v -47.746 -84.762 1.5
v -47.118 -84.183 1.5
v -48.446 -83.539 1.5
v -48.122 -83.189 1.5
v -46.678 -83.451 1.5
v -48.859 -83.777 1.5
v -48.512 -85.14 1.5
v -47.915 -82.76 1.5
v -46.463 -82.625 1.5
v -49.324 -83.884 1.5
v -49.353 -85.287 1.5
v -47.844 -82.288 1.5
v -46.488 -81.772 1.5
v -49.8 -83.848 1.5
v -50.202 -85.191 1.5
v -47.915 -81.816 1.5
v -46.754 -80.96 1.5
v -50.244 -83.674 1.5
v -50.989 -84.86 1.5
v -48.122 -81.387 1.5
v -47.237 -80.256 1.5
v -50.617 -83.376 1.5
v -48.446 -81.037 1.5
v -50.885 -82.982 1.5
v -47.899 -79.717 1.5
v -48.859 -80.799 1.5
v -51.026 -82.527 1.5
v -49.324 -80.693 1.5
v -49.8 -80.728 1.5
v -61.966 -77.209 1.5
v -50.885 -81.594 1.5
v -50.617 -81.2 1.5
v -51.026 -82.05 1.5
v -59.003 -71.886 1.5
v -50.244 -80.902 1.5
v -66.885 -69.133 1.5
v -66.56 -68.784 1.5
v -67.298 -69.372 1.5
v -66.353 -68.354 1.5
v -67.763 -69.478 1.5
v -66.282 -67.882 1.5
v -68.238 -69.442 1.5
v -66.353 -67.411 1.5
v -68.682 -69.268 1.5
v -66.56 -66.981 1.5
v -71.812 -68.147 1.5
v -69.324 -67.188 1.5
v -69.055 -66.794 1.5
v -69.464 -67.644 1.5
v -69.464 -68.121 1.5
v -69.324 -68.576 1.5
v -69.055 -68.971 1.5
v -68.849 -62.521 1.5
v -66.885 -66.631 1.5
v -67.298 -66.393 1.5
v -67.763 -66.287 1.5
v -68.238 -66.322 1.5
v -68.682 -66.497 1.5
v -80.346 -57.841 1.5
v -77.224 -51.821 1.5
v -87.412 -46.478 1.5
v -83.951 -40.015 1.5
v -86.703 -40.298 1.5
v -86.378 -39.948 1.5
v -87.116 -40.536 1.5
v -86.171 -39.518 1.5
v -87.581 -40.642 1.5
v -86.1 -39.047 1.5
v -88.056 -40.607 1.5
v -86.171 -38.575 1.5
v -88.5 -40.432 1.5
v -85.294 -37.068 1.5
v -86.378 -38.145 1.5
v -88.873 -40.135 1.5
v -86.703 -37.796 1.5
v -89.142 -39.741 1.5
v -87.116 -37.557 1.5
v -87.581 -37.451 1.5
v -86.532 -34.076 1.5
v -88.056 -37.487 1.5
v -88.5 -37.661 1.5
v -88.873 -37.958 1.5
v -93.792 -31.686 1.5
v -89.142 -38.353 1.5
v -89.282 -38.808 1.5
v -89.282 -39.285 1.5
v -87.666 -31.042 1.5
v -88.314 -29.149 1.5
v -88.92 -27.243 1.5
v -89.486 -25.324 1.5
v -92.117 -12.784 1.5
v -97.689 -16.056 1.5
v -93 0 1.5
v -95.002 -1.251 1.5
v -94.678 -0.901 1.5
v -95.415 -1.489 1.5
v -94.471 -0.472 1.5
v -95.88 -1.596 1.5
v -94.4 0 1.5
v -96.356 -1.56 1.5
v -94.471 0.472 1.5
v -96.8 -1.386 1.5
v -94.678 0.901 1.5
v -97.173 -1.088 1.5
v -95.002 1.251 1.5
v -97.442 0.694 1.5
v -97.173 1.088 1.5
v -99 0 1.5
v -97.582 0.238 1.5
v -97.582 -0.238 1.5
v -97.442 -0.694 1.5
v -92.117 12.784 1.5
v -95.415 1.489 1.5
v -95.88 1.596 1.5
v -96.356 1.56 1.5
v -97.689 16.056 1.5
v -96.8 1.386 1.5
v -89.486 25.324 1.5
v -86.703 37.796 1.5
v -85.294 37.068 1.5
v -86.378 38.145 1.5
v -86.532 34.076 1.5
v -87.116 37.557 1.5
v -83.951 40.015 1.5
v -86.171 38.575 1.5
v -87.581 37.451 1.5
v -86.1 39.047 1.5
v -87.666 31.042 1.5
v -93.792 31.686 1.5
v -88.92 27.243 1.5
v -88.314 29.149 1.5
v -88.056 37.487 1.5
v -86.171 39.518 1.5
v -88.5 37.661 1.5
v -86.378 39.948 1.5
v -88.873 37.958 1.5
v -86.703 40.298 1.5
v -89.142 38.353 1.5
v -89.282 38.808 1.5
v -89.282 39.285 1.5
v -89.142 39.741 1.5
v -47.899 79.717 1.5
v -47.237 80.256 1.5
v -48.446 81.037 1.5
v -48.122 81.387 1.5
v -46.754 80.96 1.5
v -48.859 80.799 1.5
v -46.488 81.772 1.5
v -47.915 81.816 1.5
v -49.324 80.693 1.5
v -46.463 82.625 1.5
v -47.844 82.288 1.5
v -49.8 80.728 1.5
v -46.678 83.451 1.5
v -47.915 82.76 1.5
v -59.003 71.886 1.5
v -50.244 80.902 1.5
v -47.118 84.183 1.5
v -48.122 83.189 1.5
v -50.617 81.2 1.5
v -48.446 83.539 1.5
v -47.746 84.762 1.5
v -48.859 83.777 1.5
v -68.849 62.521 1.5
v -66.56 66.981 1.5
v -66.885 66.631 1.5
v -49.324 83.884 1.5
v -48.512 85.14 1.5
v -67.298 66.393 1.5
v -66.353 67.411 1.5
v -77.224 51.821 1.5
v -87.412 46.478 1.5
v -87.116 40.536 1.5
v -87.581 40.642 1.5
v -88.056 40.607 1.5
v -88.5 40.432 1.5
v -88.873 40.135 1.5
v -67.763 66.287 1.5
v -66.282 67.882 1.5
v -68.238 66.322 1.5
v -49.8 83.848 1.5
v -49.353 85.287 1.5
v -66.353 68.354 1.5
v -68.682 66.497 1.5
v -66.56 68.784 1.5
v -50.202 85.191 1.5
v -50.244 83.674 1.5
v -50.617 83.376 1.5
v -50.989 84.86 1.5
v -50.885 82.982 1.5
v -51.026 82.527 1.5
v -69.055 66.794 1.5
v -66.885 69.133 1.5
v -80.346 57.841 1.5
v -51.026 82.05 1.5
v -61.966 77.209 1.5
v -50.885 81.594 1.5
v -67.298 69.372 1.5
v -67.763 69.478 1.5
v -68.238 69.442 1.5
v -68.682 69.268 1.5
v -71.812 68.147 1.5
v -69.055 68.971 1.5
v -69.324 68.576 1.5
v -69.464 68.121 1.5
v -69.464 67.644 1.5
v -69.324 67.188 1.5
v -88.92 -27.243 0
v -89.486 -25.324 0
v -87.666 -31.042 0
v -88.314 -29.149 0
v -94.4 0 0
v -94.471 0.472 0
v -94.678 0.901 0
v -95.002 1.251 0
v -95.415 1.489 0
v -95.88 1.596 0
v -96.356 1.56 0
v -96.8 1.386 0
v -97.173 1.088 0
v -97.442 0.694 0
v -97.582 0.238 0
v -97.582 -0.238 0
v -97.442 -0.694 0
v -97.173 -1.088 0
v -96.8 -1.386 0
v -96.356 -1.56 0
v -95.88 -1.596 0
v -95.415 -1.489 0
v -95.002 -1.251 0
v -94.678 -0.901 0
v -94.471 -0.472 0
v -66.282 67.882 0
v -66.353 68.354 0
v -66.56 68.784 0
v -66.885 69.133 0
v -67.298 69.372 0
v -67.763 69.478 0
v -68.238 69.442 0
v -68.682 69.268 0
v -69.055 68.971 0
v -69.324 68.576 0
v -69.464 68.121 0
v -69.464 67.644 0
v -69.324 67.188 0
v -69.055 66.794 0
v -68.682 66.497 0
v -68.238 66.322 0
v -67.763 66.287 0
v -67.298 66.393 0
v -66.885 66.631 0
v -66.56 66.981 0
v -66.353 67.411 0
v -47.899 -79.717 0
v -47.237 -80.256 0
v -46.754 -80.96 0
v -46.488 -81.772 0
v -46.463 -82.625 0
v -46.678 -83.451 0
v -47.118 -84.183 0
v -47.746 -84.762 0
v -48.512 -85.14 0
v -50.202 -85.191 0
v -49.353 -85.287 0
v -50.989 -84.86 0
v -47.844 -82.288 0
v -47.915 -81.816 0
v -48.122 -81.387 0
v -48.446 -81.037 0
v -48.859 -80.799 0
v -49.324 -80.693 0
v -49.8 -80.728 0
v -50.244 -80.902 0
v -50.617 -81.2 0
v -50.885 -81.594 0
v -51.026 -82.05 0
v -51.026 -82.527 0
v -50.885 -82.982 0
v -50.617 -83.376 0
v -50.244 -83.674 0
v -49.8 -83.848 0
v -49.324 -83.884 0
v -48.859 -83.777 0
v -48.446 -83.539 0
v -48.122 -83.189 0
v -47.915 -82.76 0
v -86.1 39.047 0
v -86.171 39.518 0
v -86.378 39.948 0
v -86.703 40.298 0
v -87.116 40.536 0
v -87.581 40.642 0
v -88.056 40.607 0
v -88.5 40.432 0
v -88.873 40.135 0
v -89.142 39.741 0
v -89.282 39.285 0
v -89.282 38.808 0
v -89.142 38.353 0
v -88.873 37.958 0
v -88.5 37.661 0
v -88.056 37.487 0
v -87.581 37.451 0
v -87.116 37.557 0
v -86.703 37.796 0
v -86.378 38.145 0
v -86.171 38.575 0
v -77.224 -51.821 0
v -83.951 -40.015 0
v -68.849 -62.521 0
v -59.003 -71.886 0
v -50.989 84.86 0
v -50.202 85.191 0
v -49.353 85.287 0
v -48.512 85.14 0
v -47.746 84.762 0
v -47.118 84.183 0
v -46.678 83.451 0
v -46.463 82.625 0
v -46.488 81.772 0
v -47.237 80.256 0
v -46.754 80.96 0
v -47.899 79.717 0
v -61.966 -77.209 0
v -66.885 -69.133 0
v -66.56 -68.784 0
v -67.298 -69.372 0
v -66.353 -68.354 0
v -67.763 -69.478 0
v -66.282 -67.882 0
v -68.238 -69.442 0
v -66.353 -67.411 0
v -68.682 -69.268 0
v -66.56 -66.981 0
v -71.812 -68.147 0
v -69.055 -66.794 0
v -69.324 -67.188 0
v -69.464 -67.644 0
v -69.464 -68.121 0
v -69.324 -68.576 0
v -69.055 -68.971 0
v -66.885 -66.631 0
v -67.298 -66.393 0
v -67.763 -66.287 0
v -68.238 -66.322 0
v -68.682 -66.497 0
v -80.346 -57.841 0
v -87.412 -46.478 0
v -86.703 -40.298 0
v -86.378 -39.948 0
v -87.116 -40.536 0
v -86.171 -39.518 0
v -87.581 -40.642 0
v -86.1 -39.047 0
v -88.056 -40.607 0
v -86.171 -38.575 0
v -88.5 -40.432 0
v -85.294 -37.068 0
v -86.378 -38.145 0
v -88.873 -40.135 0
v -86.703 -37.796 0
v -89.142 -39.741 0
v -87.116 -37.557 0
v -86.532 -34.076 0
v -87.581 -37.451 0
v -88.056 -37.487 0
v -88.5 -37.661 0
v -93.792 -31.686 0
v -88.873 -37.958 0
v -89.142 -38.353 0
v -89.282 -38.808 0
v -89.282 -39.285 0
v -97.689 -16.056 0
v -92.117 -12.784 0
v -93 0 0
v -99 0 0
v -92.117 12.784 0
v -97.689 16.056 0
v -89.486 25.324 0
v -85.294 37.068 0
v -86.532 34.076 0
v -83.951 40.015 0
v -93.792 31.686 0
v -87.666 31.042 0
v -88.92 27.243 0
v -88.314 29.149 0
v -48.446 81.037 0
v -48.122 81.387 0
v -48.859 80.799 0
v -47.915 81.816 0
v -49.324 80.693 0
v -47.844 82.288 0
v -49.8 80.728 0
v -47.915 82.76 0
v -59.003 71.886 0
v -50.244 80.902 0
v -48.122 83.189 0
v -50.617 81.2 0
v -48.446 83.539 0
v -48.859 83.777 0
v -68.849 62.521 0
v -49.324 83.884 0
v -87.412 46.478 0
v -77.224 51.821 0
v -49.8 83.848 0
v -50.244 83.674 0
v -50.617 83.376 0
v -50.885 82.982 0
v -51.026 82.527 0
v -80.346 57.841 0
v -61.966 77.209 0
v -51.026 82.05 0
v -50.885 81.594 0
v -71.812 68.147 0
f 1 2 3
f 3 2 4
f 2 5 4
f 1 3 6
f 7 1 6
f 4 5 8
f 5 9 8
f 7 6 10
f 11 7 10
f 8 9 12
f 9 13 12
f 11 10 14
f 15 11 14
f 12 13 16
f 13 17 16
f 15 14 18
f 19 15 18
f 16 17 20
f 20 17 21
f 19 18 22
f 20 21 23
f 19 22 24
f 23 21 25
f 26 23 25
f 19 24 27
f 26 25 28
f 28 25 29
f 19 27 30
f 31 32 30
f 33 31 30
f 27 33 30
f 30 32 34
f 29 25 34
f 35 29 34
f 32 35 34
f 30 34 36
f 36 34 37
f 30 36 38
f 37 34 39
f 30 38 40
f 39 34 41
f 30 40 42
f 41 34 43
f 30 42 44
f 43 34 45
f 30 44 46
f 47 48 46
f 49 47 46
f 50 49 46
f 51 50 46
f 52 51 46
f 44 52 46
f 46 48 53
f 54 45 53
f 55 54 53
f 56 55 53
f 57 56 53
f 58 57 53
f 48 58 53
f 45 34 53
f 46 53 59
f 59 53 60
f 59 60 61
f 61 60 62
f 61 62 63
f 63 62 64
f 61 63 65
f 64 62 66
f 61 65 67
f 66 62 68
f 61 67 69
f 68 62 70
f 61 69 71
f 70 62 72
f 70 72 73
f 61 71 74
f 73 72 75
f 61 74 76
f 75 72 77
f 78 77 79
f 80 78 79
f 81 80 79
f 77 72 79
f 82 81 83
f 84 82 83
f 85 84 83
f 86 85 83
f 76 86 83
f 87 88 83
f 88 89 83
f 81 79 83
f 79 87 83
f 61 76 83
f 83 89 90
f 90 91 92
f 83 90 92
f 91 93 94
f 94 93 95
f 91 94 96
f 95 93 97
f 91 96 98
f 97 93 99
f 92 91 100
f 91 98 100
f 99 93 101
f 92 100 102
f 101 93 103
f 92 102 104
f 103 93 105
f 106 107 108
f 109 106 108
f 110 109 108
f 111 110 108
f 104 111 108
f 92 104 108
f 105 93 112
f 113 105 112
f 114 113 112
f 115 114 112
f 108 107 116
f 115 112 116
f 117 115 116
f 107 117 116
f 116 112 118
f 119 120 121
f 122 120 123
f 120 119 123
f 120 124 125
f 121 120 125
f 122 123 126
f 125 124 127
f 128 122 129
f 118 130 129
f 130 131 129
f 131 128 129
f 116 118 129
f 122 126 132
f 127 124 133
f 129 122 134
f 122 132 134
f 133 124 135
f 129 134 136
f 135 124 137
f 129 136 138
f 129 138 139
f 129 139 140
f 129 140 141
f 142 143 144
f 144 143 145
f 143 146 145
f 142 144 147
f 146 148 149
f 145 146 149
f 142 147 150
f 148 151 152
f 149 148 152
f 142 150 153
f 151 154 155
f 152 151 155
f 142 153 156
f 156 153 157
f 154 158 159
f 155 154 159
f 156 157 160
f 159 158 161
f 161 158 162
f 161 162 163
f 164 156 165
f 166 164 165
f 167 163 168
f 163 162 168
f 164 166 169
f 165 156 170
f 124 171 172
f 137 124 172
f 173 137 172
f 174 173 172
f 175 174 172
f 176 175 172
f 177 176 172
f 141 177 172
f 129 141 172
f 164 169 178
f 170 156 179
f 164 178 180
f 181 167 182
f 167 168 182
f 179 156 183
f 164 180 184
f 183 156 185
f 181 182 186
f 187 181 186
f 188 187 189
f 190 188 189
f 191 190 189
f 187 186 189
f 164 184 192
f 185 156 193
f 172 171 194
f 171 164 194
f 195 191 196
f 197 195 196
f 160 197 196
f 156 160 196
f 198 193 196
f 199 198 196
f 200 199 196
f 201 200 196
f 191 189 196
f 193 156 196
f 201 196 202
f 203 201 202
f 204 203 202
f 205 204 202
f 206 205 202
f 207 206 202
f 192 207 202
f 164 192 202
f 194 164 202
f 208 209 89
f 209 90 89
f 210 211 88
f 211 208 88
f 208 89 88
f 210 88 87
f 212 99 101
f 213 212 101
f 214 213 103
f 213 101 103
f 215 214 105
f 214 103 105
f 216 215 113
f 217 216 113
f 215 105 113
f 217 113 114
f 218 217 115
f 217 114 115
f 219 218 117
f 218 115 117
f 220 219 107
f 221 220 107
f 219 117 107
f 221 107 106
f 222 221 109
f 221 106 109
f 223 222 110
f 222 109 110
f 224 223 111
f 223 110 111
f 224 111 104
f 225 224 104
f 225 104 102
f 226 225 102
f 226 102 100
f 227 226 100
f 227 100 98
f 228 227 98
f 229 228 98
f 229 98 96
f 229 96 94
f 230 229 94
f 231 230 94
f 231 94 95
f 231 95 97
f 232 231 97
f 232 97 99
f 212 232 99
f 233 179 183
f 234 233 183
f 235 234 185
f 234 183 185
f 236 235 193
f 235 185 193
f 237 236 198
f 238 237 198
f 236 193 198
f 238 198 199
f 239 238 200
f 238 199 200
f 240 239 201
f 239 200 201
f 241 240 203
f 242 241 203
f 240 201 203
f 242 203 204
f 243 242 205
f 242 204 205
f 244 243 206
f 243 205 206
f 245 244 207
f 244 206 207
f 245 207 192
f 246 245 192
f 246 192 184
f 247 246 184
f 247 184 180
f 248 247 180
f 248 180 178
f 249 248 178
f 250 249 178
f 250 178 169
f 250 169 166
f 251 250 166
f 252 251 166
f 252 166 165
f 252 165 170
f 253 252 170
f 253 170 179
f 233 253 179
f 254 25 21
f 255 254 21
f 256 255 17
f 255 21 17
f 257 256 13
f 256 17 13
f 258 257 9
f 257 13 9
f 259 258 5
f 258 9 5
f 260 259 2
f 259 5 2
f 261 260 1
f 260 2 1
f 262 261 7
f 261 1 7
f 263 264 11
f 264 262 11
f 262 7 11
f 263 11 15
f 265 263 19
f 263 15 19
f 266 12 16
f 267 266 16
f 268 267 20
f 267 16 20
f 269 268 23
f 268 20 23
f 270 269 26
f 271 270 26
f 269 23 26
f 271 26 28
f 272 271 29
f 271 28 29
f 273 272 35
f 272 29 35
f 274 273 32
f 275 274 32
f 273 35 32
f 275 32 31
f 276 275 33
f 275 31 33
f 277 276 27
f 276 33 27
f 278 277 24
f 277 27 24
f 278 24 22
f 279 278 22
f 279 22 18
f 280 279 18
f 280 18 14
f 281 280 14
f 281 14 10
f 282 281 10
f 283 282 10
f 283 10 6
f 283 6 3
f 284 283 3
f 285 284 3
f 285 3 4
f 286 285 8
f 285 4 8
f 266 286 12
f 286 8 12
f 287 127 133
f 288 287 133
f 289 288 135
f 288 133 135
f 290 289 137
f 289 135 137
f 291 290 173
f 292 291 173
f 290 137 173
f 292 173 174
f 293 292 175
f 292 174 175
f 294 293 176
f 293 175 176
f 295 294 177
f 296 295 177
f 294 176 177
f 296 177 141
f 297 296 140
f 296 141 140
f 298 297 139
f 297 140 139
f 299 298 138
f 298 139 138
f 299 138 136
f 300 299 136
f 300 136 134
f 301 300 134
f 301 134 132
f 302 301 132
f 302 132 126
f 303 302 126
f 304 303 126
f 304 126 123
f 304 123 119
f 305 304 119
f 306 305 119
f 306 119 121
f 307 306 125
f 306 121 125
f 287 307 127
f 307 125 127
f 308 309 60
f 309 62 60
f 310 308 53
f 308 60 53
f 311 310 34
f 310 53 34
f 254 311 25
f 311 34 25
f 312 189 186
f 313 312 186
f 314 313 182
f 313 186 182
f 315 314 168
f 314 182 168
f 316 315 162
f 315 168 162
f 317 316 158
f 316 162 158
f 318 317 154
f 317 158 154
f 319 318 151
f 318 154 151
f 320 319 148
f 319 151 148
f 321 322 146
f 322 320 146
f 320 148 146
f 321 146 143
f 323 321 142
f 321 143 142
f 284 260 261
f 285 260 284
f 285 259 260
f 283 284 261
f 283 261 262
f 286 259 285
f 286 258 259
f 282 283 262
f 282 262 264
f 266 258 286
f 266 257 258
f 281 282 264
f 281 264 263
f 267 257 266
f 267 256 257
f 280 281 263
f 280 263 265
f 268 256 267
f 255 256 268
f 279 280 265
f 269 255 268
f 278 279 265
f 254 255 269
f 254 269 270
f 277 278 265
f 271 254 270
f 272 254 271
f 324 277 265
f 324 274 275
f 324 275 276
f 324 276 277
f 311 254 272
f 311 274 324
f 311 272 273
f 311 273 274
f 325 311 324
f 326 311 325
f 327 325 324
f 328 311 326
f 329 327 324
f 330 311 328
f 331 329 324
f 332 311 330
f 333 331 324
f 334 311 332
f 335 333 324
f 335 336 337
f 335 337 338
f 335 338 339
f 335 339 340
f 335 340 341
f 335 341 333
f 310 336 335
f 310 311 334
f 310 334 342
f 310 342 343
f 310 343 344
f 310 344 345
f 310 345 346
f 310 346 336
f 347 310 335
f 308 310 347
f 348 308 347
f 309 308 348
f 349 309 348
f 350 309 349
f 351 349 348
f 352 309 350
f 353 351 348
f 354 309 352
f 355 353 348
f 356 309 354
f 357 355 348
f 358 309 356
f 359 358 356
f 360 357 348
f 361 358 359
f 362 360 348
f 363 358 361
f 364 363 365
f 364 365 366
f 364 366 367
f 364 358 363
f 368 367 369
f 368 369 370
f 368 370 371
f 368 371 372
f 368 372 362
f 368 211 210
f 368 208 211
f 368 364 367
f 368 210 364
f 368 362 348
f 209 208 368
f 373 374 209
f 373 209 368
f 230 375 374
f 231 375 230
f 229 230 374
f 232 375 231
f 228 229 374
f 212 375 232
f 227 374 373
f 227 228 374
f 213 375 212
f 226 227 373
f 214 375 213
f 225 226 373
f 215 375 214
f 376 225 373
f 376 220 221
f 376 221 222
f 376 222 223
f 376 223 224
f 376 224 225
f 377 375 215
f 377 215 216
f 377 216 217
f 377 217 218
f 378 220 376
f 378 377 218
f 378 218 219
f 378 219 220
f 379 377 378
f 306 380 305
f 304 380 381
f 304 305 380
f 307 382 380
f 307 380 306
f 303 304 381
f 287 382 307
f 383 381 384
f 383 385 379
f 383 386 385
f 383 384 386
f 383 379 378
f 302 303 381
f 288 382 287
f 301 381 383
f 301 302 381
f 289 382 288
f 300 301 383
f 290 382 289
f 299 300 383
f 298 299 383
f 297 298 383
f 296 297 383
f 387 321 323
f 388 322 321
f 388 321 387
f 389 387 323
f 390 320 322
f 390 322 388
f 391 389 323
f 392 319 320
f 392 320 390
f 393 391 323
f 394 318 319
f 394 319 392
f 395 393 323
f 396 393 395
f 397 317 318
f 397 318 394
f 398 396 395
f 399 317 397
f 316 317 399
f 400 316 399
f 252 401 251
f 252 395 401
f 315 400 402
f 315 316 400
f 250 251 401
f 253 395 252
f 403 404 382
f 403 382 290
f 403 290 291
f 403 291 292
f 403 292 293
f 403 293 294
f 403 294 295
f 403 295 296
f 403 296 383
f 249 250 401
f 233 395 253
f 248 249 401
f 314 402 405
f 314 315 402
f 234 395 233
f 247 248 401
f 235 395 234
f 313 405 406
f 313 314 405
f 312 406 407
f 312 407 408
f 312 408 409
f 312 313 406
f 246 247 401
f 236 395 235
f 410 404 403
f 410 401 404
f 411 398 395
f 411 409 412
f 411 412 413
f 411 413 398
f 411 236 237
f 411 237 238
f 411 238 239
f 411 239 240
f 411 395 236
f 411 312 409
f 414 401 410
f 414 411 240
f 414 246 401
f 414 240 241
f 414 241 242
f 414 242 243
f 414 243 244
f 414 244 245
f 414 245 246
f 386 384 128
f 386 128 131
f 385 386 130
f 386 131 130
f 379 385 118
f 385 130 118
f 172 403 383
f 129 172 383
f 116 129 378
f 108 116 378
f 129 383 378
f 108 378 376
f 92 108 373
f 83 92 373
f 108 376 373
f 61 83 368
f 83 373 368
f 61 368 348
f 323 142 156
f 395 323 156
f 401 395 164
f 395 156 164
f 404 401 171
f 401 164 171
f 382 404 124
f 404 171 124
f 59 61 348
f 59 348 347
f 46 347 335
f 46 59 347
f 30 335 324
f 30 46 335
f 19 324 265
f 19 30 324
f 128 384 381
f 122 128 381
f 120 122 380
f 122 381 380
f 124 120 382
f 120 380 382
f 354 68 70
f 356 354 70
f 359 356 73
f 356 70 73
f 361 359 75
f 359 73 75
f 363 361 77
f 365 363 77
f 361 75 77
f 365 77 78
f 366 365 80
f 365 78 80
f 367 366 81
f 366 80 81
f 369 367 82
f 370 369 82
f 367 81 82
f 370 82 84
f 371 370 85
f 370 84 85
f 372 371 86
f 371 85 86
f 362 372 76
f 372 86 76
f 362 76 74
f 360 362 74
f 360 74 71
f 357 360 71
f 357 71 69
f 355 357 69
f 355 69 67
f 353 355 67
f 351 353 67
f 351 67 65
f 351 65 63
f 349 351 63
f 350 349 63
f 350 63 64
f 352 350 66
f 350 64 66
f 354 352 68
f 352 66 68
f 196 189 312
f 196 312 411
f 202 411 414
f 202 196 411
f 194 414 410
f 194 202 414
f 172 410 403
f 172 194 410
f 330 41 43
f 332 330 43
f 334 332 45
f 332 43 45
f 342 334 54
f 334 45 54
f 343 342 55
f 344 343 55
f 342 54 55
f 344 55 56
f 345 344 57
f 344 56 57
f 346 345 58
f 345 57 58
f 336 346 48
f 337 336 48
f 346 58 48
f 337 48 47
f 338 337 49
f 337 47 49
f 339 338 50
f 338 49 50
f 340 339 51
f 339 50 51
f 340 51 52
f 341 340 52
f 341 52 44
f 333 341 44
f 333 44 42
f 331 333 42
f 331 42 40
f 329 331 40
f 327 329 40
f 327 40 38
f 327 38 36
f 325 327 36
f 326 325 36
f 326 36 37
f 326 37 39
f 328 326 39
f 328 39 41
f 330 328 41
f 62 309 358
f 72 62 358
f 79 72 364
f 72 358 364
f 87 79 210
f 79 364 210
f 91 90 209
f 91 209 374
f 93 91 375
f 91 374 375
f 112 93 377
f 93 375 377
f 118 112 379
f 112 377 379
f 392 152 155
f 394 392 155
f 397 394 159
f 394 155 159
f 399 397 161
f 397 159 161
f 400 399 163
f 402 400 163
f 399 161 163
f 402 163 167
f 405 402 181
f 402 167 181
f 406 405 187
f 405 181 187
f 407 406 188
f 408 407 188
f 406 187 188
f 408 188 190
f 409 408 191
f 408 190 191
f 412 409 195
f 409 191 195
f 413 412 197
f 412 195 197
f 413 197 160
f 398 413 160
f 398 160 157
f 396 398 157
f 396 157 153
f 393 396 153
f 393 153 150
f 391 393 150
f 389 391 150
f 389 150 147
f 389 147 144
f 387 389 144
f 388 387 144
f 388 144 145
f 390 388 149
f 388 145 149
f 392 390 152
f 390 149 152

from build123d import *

# Parameters (mm, degrees)
SKETCH1_R            = 1.4
SKETCH1_R_2          = 1.6
SKETCH1_R_3          = 56
BOSS_EXTRUDE2_DEPTH  = 1.5
BOSS_EXTRUDE3_DEPTH  = 1.5
SKETCH3_R            = 1.6
CUT_EXTRUDE1_DEPTH   = 10
SKETCH4_R            = 1.6
BOSS_EXTRUDE4_DEPTH  = 1.5
FILLET1_R            = 3
SKETCH5_R            = 1.6
BOSS_EXTRUDE5_DEPTH  = 1.5
SKETCH6_R            = 1.6
CUT_EXTRUDE2_DEPTH   = 1.5
CUT_EXTRUDE3_DEPTH   = 10
SKETCH8_R            = 1.4
BOSS_EXTRUDE6_DEPTH  = 1.5
SKETCH9_W            = 144
SKETCH9_H            = 6
BOSS_EXTRUDE7_DEPTH  = 1.5
BOSS_EXTRUDE8_DEPTH  = 1.5
SKETCH11_W           = 71.777589622
SKETCH11_H           = 10.305965164
CUT_EXTRUDE4_DEPTH   = 41
SKETCH12_W           = 71.777589622
SKETCH12_H           = 6
BOSS_EXTRUDE9_DEPTH  = 1.5
SKETCH13_W           = 6
SKETCH13_H           = 51.475780146
SKETCH13_H_2         = 46.82423944
BOSS_EXTRUDE10_DEPTH = 1.5
SKETCH14_W           = 66
SKETCH14_H           = 6
CUT_EXTRUDE5_DEPTH   = 41
BOSS_EXTRUDE11_DEPTH = 1.5
SKETCH16_R           = 1.6
CUT_EXTRUDE6_DEPTH   = 5
SKETCH17_R           = 1.6
CUT_EXTRUDE7_DEPTH   = 5
SKETCH18_R           = 1.6
BOSS_EXTRUDE14_DEPTH = 1.5
BOSS_EXTRUDE15_DEPTH = 1.5
SKETCH21_W           = 1.5
SKETCH21_H           = 32.106154556
BOSS_EXTRUDE16_DEPTH = 1.5
SKETCH22_R           = 1.6
SKETCH22_R_2         = 1.7
CUT_EXTRUDE9_DEPTH   = 1.5
BOSS_EXTRUDE17_DEPTH = 1.5
SKETCH24_R           = 1.6
CUT_EXTRUDE10_DEPTH  = 1.5
SKETCH25_R           = 1.6
BOSS_EXTRUDE18_DEPTH = 1.5
SKETCH26_R           = 1.6
CUT_EXTRUDE11_DEPTH  = 1.5
SKETCH28_R           = 1.6
CUT_EXTRUDE12_DEPTH  = 1.5
SKETCH29_R           = 1.6
BOSS_EXTRUDE19_DEPTH = 1.5
SKETCH30_W           = 4.95
SKETCH30_H           = 32.106154556
SKETCH30_W_2         = 1.5
CUT_EXTRUDE13_DEPTH  = 1.5
BOSS_EXTRUDE20_DEPTH = 1.5
SKETCH32_R           = 1.6
BOSS_EXTRUDE21_DEPTH = 1.5
CUT_EXTRUDE14_DEPTH  = 10
SKETCH34_R           = 1.6
CUT_EXTRUDE15_DEPTH  = 10


with BuildPart() as part:
    # Sketch1 → Boss-Extrude2 (new body)
    with BuildSketch(Plane.XY):
        with BuildLine():
            Line((-35.888794811, 73.41211972), (-35.888794811, 92.265889727))
            ThreePointArc((-35.888794811, 92.265889727), (-42.061063674, 89.620683565), (-48.039811225, 86.563136135))
            Line((-48.039811225, 86.563136135), (-41.888794811, 80.41211972))
            Line((-41.888794811, 80.41211972), (-41.888794811, 65.59143593))
            Line((-41.888794811, 65.59143593), (-53.74011537, 53.74011537))
            Line((-53.74011537, 53.74011537), (-65.053823869, 42.426406871))
            Line((-65.053823869, 42.426406871), (-71.46564447, 36.01458627))
            Line((-71.46564447, 36.01458627), (-82.641648571, 47.190590371))
            ThreePointArc((-82.641648571, 47.190590371), (-85.206397148, 48.036317618), (-87.411811693, 46.477684716))
            ThreePointArc((-87.411811693, 46.477684716), (-99, 0), (-87.411811693, -46.477684716))
            ThreePointArc((-87.411811693, -46.477684716), (-85.206397148, -48.036317618), (-82.641648571, -47.190590371))
            Line((-82.641648571, -47.190590371), (-71.46564447, -36.01458627))
            Line((-71.46564447, -36.01458627), (-65.053823869, -42.426406871))
            Line((-65.053823869, -42.426406871), (-53.74011537, -53.74011537))
            Line((-53.74011537, -53.74011537), (-41.888794811, -65.59143593))
            Line((-41.888794811, -65.59143593), (-41.888794811, -80.41211972))
            Line((-41.888794811, -80.41211972), (-48.039811225, -86.563136135))
            ThreePointArc((-48.039811225, -86.563136135), (-42.061063674, -89.620683565), (-35.888794811, -92.265889727))
            Line((-35.888794811, -92.265889727), (-35.888794811, -73.41211972))
            Line((-35.888794811, -73.41211972), (35.888794811, -73.41211972))
            Line((35.888794811, -73.41211972), (35.888794811, -92.265889727))
            ThreePointArc((35.888794811, -92.265889727), (42.061063674, -89.620683565), (48.039811225, -86.563136135))
            Line((48.039811225, -86.563136135), (41.888794811, -80.41211972))
            Line((41.888794811, -80.41211972), (41.888794811, -65.59143593))
            Line((41.888794811, -65.59143593), (53.74011537, -53.74011537))
            Line((53.74011537, -53.74011537), (65.053823869, -42.426406871))
            Line((65.053823869, -42.426406871), (71.46564447, -36.01458627))
            Line((71.46564447, -36.01458627), (82.641648571, -47.190590371))
            ThreePointArc((82.641648571, -47.190590371), (85.206397148, -48.036317618), (87.411811693, -46.477684716))
            ThreePointArc((87.411811693, -46.477684716), (99, 0), (87.411811693, 46.477684716))
            ThreePointArc((87.411811693, 46.477684716), (85.206397148, 48.036317618), (82.641648571, 47.190590371))
            Line((82.641648571, 47.190590371), (71.46564447, 36.01458627))
            Line((71.46564447, 36.01458627), (65.053823869, 42.426406871))
            Line((65.053823869, 42.426406871), (53.74011537, 53.74011537))
            Line((53.74011537, 53.74011537), (41.888794811, 65.59143593))
            Line((41.888794811, 65.59143593), (41.888794811, 80.41211972))
            Line((41.888794811, 80.41211972), (48.039811225, 86.563136135))
            ThreePointArc((48.039811225, 86.563136135), (42.061063674, 89.620683565), (35.888794811, 92.265889727))
            Line((35.888794811, 92.265889727), (35.888794811, 73.41211972))
            Line((35.888794811, 73.41211972), (-35.888794811, 73.41211972))
        make_face()
        with Locations((-36.062445841, 54.447222151)):
            Circle(SKETCH1_R, mode=Mode.SUBTRACT)
        with Locations((-54.447222151, 36.062445841)):
            Circle(SKETCH1_R, mode=Mode.SUBTRACT)
        with Locations((-60.104076401, 41.71930009)):
            Circle(SKETCH1_R, mode=Mode.SUBTRACT)
        with Locations((-41.71930009, 60.104076401)):
            Circle(SKETCH1_R, mode=Mode.SUBTRACT)
        with Locations((41.365746699, 41.365746699)):
            Circle(SKETCH1_R_2, mode=Mode.SUBTRACT)
        with Locations((41.71930009, 60.104076401)):
            Circle(SKETCH1_R, mode=Mode.SUBTRACT)
        with Locations((60.104076401, 41.71930009)):
            Circle(SKETCH1_R, mode=Mode.SUBTRACT)
        with Locations((54.447222151, 36.062445841)):
            Circle(SKETCH1_R, mode=Mode.SUBTRACT)
        Circle(SKETCH1_R_3, mode=Mode.SUBTRACT)
        with Locations((36.062445841, 54.447222151)):
            Circle(SKETCH1_R, mode=Mode.SUBTRACT)
        with Locations((-40.571353127, 87.005547556)):
            Circle(SKETCH1_R_2, mode=Mode.SUBTRACT)
        with Locations((40.571353127, -87.005547556)):
            Circle(SKETCH1_R_2, mode=Mode.SUBTRACT)
        with Locations((-40.571353127, -87.005547556)):
            Circle(SKETCH1_R_2, mode=Mode.SUBTRACT)
        with Locations((41.365746699, -41.365746699)):
            Circle(SKETCH1_R_2, mode=Mode.SUBTRACT)
        with Locations((-41.365746699, 41.365746699)):
            Circle(SKETCH1_R_2, mode=Mode.SUBTRACT)
        with Locations((-84.762968914, 45.069270027)):
            Circle(SKETCH1_R_2, mode=Mode.SUBTRACT)
        with Locations((-41.365746699, -41.365746699)):
            Circle(SKETCH1_R_2, mode=Mode.SUBTRACT)
        with Locations((84.762968914, 45.069270027)):
            Circle(SKETCH1_R_2, mode=Mode.SUBTRACT)
        with Locations((40.571353127, 87.005547556)):
            Circle(SKETCH1_R_2, mode=Mode.SUBTRACT)
        with Locations((36.062445841, -54.447222151)):
            Circle(SKETCH1_R, mode=Mode.SUBTRACT)
        with Locations((54.447222151, -36.062445841)):
            Circle(SKETCH1_R, mode=Mode.SUBTRACT)
        with Locations((60.104076401, -41.71930009)):
            Circle(SKETCH1_R, mode=Mode.SUBTRACT)
        with Locations((41.71930009, -60.104076401)):
            Circle(SKETCH1_R, mode=Mode.SUBTRACT)
        with Locations((-41.71930009, -60.104076401)):
            Circle(SKETCH1_R, mode=Mode.SUBTRACT)
        with Locations((-60.104076401, -41.71930009)):
            Circle(SKETCH1_R, mode=Mode.SUBTRACT)
        with Locations((-54.447222151, -36.062445841)):
            Circle(SKETCH1_R, mode=Mode.SUBTRACT)
        with Locations((-36.062445841, -54.447222151)):
            Circle(SKETCH1_R, mode=Mode.SUBTRACT)
        with Locations((84.762968914, -45.069270027)):
            Circle(SKETCH1_R_2, mode=Mode.SUBTRACT)
        with Locations((-84.762968914, -45.069270027)):
            Circle(SKETCH1_R_2, mode=Mode.SUBTRACT)
        with BuildLine():
            Line((-56.568542495, 42.426406871), (-49.621038435, 35.478902811))
            ThreePointArc((-49.621038435, 35.478902811), (-43.133513652, 43.133513652), (-35.478902811, 49.621038435))
            Line((-35.478902811, 49.621038435), (-42.426406871, 56.568542495))
            Line((-42.426406871, 56.568542495), (-56.568542495, 42.426406871))
        make_face(mode=Mode.SUBTRACT)
        with BuildLine():
            Line((-57.337431152, 34.710014154), (-52.937019276, 30.309602278))
            ThreePointArc((-52.937019276, 30.309602278), (-61, 0), (-52.937019276, -30.309602278))
            Line((-52.937019276, -30.309602278), (-57.337431152, -34.710014154))
            Line((-57.337431152, -34.710014154), (-60.811183182, -38.183766184))
            Line((-60.811183182, -38.183766184), (-71.46564447, -27.529304896))
            Line((-71.46564447, -27.529304896), (-83.951228087, -40.014888513))
            ThreePointArc((-83.951228087, -40.014888513), (-93, 0), (-83.951228087, 40.014888513))
            Line((-83.951228087, 40.014888513), (-71.46564447, 27.529304896))
            Line((-71.46564447, 27.529304896), (-60.811183182, 38.183766184))
            Line((-60.811183182, 38.183766184), (-57.337431152, 34.710014154))
        make_face(mode=Mode.SUBTRACT)
        with BuildLine():
            Line((-35.888794811, 67.41211972), (-35.888794811, 58.516211808))
            Line((-35.888794811, 58.516211808), (-30.309602278, 52.937019275))
            ThreePointArc((-30.309602278, 52.937019275), (0, 61), (30.309602278, 52.937019275))
            Line((30.309602278, 52.937019275), (35.888794811, 58.516211808))
            Line((35.888794811, 58.516211808), (35.888794811, 67.41211972))
            Line((35.888794811, 67.41211972), (0, 67.41211972))
            Line((0, 67.41211972), (-35.888794811, 67.41211972))
        make_face(mode=Mode.SUBTRACT)
        with BuildLine():
            Line((60.811183182, 38.183766184), (71.46564447, 27.529304896))
            Line((71.46564447, 27.529304896), (83.951228087, 40.014888513))
            ThreePointArc((83.951228087, 40.014888513), (93, 0), (83.951228087, -40.014888513))
            Line((83.951228087, -40.014888513), (71.46564447, -27.529304896))
            Line((71.46564447, -27.529304896), (60.811183182, -38.183766184))
            Line((60.811183182, -38.183766184), (57.337431152, -34.710014154))
            Line((57.337431152, -34.710014154), (52.937019276, -30.309602278))
            ThreePointArc((52.937019276, -30.309602278), (61, 0), (52.937019276, 30.309602278))
            Line((52.937019276, 30.309602278), (57.337431152, 34.710014154))
            Line((57.337431152, 34.710014154), (60.811183182, 38.183766184))
        make_face(mode=Mode.SUBTRACT)
        with BuildLine():
            Line((42.426406871, 56.568542495), (56.568542495, 42.426406871))
            Line((56.568542495, 42.426406871), (49.621038435, 35.478902811))
            ThreePointArc((49.621038435, 35.478902811), (43.133513652, 43.133513652), (35.478902811, 49.621038435))
            Line((35.478902811, 49.621038435), (42.426406871, 56.568542495))
        make_face(mode=Mode.SUBTRACT)
        with BuildLine():
            Line((0, -67.41211972), (35.888794811, -67.41211972))
            Line((35.888794811, -67.41211972), (35.888794811, -58.516211808))
            Line((35.888794811, -58.516211808), (30.309602278, -52.937019275))
            ThreePointArc((30.309602278, -52.937019275), (0, -61), (-30.309602278, -52.937019275))
            Line((-30.309602278, -52.937019275), (-35.888794811, -58.516211808))
            Line((-35.888794811, -58.516211808), (-35.888794811, -67.41211972))
            Line((-35.888794811, -67.41211972), (0, -67.41211972))
        make_face(mode=Mode.SUBTRACT)
        with BuildLine():
            Line((56.568542495, -42.426406871), (49.621038435, -35.478902811))
            ThreePointArc((49.621038435, -35.478902811), (43.133513652, -43.133513652), (35.478902811, -49.621038435))
            Line((35.478902811, -49.621038435), (42.426406871, -56.568542495))
            Line((42.426406871, -56.568542495), (56.568542495, -42.426406871))
        make_face(mode=Mode.SUBTRACT)
        with BuildLine():
            Line((-42.426406871, -56.568542495), (-56.568542495, -42.426406871))
            Line((-56.568542495, -42.426406871), (-49.621038435, -35.478902811))
            ThreePointArc((-49.621038435, -35.478902811), (-43.133513652, -43.133513652), (-35.478902811, -49.621038435))
            Line((-35.478902811, -49.621038435), (-42.426406871, -56.568542495))
        make_face(mode=Mode.SUBTRACT)
    extrude(amount=BOSS_EXTRUDE2_DEPTH)

    # Sketch2 → Boss-Extrude3 (add)
    with BuildSketch(Plane.XY.offset(1.5)):
        with BuildLine():
            Line((-41.888794811, 80.41211972), (-41.888794811, 78.41211972))
            Line((-41.888794811, 78.41211972), (-49.31800671, 85.841331619))
            ThreePointArc((-49.31800671, 85.841331619), (-47.440229793, 86.893179233), (-45.540030314, 87.903956902))
            Line((-45.540030314, 87.903956902), (-41.888794811, 84.252721398))
            Line((-41.888794811, 84.252721398), (-41.888794811, 80.41211972))
        make_face()
        with BuildLine():
            Line((41.888794811, 84.252721398), (45.540030314, 87.903956902))
            ThreePointArc((45.540030314, 87.903956902), (47.440229793, 86.893179233), (49.31800671, 85.841331619))
            Line((49.31800671, 85.841331619), (41.888794811, 78.41211972))
            Line((41.888794811, 78.41211972), (41.888794811, 80.41211972))
            Line((41.888794811, 80.41211972), (41.888794811, 84.252721398))
        make_face()
        with BuildLine():
            Line((41.888794811, -80.41211972), (41.888794811, -78.41211972))
            Line((41.888794811, -78.41211972), (49.31800671, -85.841331619))
            ThreePointArc((49.31800671, -85.841331619), (47.440229793, -86.893179233), (45.540030314, -87.903956902))
            Line((45.540030314, -87.903956902), (41.888794811, -84.252721398))
            Line((41.888794811, -84.252721398), (41.888794811, -80.41211972))
        make_face()
        with BuildLine():
            Line((-41.888794811, -84.252721398), (-45.540030314, -87.903956902))
            ThreePointArc((-45.540030314, -87.903956902), (-47.440229793, -86.893179233), (-49.31800671, -85.841331619))
            Line((-49.31800671, -85.841331619), (-41.888794811, -78.41211972))
            Line((-41.888794811, -78.41211972), (-41.888794811, -80.41211972))
            Line((-41.888794811, -80.41211972), (-41.888794811, -84.252721398))
        make_face()
    extrude(amount=-BOSS_EXTRUDE3_DEPTH)

    # Sketch3 → Cut-Extrude1 (cut)
    with BuildSketch(Plane.XY.offset(1.5)):
        with Locations((-44.327866871, 85.153039985)):
            Circle(SKETCH3_R)
        with Locations((44.327866871, 85.153039985)):
            Circle(SKETCH3_R)
        with Locations((44.327866871, -85.153039985)):
            Circle(SKETCH3_R)
        with Locations((-44.327866871, -85.153039985)):
            Circle(SKETCH3_R)
    extrude(amount=-CUT_EXTRUDE1_DEPTH, mode=Mode.SUBTRACT)

    # Sketch4 → Boss-Extrude4 (add)
    with BuildSketch(Plane.XY.offset(1.5)):
        with Locations((-40.571353127, 87.005547556)):
            Circle(SKETCH4_R)
        with Locations((40.571353127, 87.005547556)):
            Circle(SKETCH4_R)
        with Locations((40.571353127, -87.005547556)):
            Circle(SKETCH4_R)
        with Locations((-40.571353127, -87.005547556)):
            Circle(SKETCH4_R)
    extrude(amount=-BOSS_EXTRUDE4_DEPTH)

    # Fillet1
    fillet1_edges = [part.edges().sort_by_distance(p)[0] for p in [
        (35.888794811, -92.265889727, 0.75),
        (-35.888794811, -92.265889727, 0.75),
        (-35.888794811, 92.265889727, 0.75),
        (35.888794811, 92.265889727, 0.75),
        (49.31800671, 85.841331619, 0.75),
        (-49.31800671, 85.841331619, 0.75),
        (49.31800671, -85.841331619, 0.75),
        (-49.31800671, -85.841331619, 0.75),
    ]]
    fillet(fillet1_edges, radius=FILLET1_R)

    # Sketch5 → Boss-Extrude5 (add)
    with BuildSketch(Plane.XY.offset(1.5)):
        with BuildLine():
            ThreePointArc((-7, 66.41211972), (-10, 63.41211972), (-13, 66.41211972))
            Line((-13, 66.41211972), (-13, 67.41211972))
            Line((-13, 67.41211972), (-9.775161328, 70.187281048))
            Line((-9.775161328, 70.187281048), (-7, 67.41211972))
            Line((-7, 67.41211972), (-7, 66.41211972))
        make_face()
        with Locations((-10, 66.41211972)):
            Circle(SKETCH5_R, mode=Mode.SUBTRACT)
        with BuildLine():
            Line((7, 66.41211972), (7, 67.41211972))
            Line((7, 67.41211972), (9.775161328, 70.187281048))
            Line((9.775161328, 70.187281048), (13, 67.41211972))
            Line((13, 67.41211972), (13, 66.41211972))
            ThreePointArc((13, 66.41211972), (10, 63.41211972), (7, 66.41211972))
        make_face()
        with Locations((10, 66.41211972)):
            Circle(SKETCH5_R, mode=Mode.SUBTRACT)
        with BuildLine():
            ThreePointArc((7, -66.41211972), (10, -63.41211972), (13, -66.41211972))
            Line((13, -66.41211972), (13, -67.41211972))
            Line((13, -67.41211972), (9.775161328, -70.187281048))
            Line((9.775161328, -70.187281048), (7, -67.41211972))
            Line((7, -67.41211972), (7, -66.41211972))
        make_face()
        with Locations((10, -66.41211972)):
            Circle(SKETCH5_R, mode=Mode.SUBTRACT)
        with BuildLine():
            Line((-7, -66.41211972), (-7, -67.41211972))
            Line((-7, -67.41211972), (-9.775161328, -70.187281048))
            Line((-9.775161328, -70.187281048), (-13, -67.41211972))
            Line((-13, -67.41211972), (-13, -66.41211972))
            ThreePointArc((-13, -66.41211972), (-10, -63.41211972), (-7, -66.41211972))
        make_face()
        with Locations((-10, -66.41211972)):
            Circle(SKETCH5_R, mode=Mode.SUBTRACT)
    extrude(amount=-BOSS_EXTRUDE5_DEPTH)

    # Sketch6 → Cut-Extrude2 (cut)
    with BuildSketch(Plane.XY.offset(1.5)):
        with Locations((-10, -66.41211972)):
            Circle(SKETCH6_R)
        with Locations((10, -66.41211972)):
            Circle(SKETCH6_R)
        with Locations((10, 66.41211972)):
            Circle(SKETCH6_R)
        with Locations((-10, 66.41211972)):
            Circle(SKETCH6_R)
    extrude(amount=-CUT_EXTRUDE2_DEPTH, mode=Mode.SUBTRACT)

    # Sketch7 → Cut-Extrude3 (cut)
    with BuildSketch(Plane.XY.offset(1.5)):
        Polygon((-71.46564447, 27.529304896), (-31.582829646, 67.41211972), (31.582829646, 67.41211972), (71.46564447, 27.529304896), (71.46564447, -27.529304896), (31.582829646, -67.41211972), (-31.582829646, -67.41211972), (-71.46564447, -27.529304896), align=None)
    extrude(amount=-CUT_EXTRUDE3_DEPTH, mode=Mode.SUBTRACT)

    # Sketch8 → Boss-Extrude6 (add)
    with BuildSketch(Plane.XY.offset(1.5)):
        with Locations((-60.104076401, -41.71930009)):
            Circle(SKETCH8_R)
        with Locations((-41.71930009, -60.104076401)):
            Circle(SKETCH8_R)
        with Locations((-60.104076401, 41.71930009)):
            Circle(SKETCH8_R)
        with Locations((-41.71930009, 60.104076401)):
            Circle(SKETCH8_R)
        with Locations((41.71930009, 60.104076401)):
            Circle(SKETCH8_R)
        with Locations((60.104076401, 41.71930009)):
            Circle(SKETCH8_R)
        with Locations((60.104076401, -41.71930009)):
            Circle(SKETCH8_R)
        with Locations((41.71930009, -60.104076401)):
            Circle(SKETCH8_R)
        Polygon((-23.568897205, -67.41211972), (23.568897205, -67.41211972), (18.047381119, -71.229666129), (-16.662853075, -71.229666129), align=None)
        Polygon((23.568897205, 67.41211972), (-26.29313108, 67.41211972), (-20.11587514, 71.683041123), (11.2489996, 71.683041123), align=None)
    extrude(amount=-BOSS_EXTRUDE6_DEPTH)

    # Sketch9 → Boss-Extrude7 (add)
    with BuildSketch(Plane.XY.offset(1.5)):
        with Locations((0, 26.41211972)):
            Rectangle(SKETCH9_W, SKETCH9_H)
        with Locations((0, -26.41211972)):
            Rectangle(SKETCH9_W, SKETCH9_H)
    extrude(amount=-BOSS_EXTRUDE7_DEPTH)

    # Sketch10 → Boss-Extrude8 (add)
    with BuildSketch(Plane.XY.offset(1.5)):
        Polygon((-72, 23.41211972), (-66, 23.41211972), (-66, 35.490217447), (-72, 28.063660426), align=None)
        Polygon((72, 28.063660426), (72, 23.41211972), (66, 23.41211972), (66, 35.490217447), align=None)
        Polygon((72, -23.41211972), (66, -23.41211972), (66, -35.490217447), (72, -28.063660426), align=None)
        Polygon((-72, -28.063660426), (-72, -23.41211972), (-66, -23.41211972), (-66, -35.490217447), align=None)
    extrude(amount=-BOSS_EXTRUDE8_DEPTH)

    # Sketch11 → Cut-Extrude4 (cut)
    with BuildSketch(Plane.XY.offset(1.5)):
        with Locations((0, 68.259137138)):
            Rectangle(SKETCH11_W, SKETCH11_H)
        with Locations((0, -68.259137138)):
            Rectangle(SKETCH11_W, SKETCH11_H)
    extrude(amount=-CUT_EXTRUDE4_DEPTH, mode=Mode.SUBTRACT)

    # Sketch12 → Boss-Extrude9 (add)
    with BuildSketch(Plane.XY.offset(1.5)):
        with Locations((0, 66.106154556)):
            Rectangle(SKETCH12_W, SKETCH12_H)
        with Locations((0, -66.106154556)):
            Rectangle(SKETCH12_W, SKETCH12_H)
    extrude(amount=-BOSS_EXTRUDE9_DEPTH)

    # Sketch13 → Boss-Extrude10 (add)
    with BuildSketch(Plane.XY.offset(1.5)):
        with Locations((-69, -2.325770353)):
            Rectangle(SKETCH13_W, SKETCH13_H)
        with Locations((69, 0)):
            Rectangle(SKETCH13_W, SKETCH13_H_2)
    extrude(amount=-BOSS_EXTRUDE10_DEPTH)

    # Sketch14 → Cut-Extrude5 (cut)
    with BuildSketch(Plane.XY.offset(1.5)):
        with Locations((33, 26.41211972)):
            Rectangle(SKETCH14_W, SKETCH14_H)
        with Locations((-33, 26.41211972)):
            Rectangle(SKETCH14_W, SKETCH14_H)
        with Locations((-33, -26.41211972)):
            Rectangle(SKETCH14_W, SKETCH14_H)
        with Locations((33, -26.41211972)):
            Rectangle(SKETCH14_W, SKETCH14_H)
    extrude(amount=-CUT_EXTRUDE5_DEPTH, mode=Mode.SUBTRACT)

    # Sketch15 → Boss-Extrude11 (add)
    with BuildSketch(Plane.XY.offset(1.5)):
        Polygon((-66, -25), (0, -25), (66, -25), (66, -31), (-66, -31), align=None)
        Polygon((0, 25), (66, 25), (66, 31), (-66, 31), (-66, 25), align=None)
    extrude(amount=-BOSS_EXTRUDE11_DEPTH)

    # Sketch16 → Cut-Extrude6 (cut)
    with BuildSketch(Plane.XY.offset(1.5)):
        with Locations((60, 28)):
            Circle(SKETCH16_R)
        with Locations((-60, 28)):
            Circle(SKETCH16_R)
        with Locations((-60, -28)):
            Circle(SKETCH16_R)
        with Locations((60, -28)):
            Circle(SKETCH16_R)
    extrude(amount=-CUT_EXTRUDE6_DEPTH, mode=Mode.SUBTRACT)

    # Sketch17 → Cut-Extrude7 (cut)
    with BuildSketch(Plane.XY.offset(1.5)):
        with Locations((-40, 28)):
            Circle(SKETCH17_R)
        with Locations((40, 28)):
            Circle(SKETCH17_R)
        with Locations((40, -28)):
            Circle(SKETCH17_R)
        with Locations((-40, -28)):
            Circle(SKETCH17_R)
    extrude(amount=-CUT_EXTRUDE7_DEPTH, mode=Mode.SUBTRACT)

    # Sketch18 → Boss-Extrude14 (add)
    with BuildSketch(Plane.XY.offset(1.5)):
        Polygon((34.5, 63.106154556), (34.5, 31), (31.5, 31), (28.5, 31), (28.5, 63.106154556), align=None)
        with Locations((31.5, 49)):
            Circle(SKETCH18_R, mode=Mode.SUBTRACT)
        with Locations((31.5, 39)):
            Circle(SKETCH18_R, mode=Mode.SUBTRACT)
        Polygon((-34.5, -63.106154556), (-34.5, -31), (-31.5, -31), (-28.5, -31), (-28.5, -63.106154556), align=None)
        with Locations((-31.5, -49)):
            Circle(SKETCH18_R, mode=Mode.SUBTRACT)
        with Locations((-31.5, -39)):
            Circle(SKETCH18_R, mode=Mode.SUBTRACT)
    extrude(amount=-BOSS_EXTRUDE14_DEPTH)

    # Sketch19 → Boss-Extrude15 (add)
    with BuildSketch(Plane.XY.offset(1.5)):
        Polygon((-38, 31), (-35, 31), (-35, 63.106154556), (-35.888794811, 63.106154556), (-41, 57.994949366), (-41, 31), align=None)
        with BuildLine():
            ThreePointArc((-36.4, 39), (-36.86862915, 37.86862915), (-38, 37.4))
            ThreePointArc((-38, 37.4), (-39.6, 39), (-38, 40.6))
            ThreePointArc((-38, 40.6), (-36.86862915, 40.13137085), (-36.4, 39))
        make_face(mode=Mode.SUBTRACT)
        with BuildLine():
            ThreePointArc((-36.4, 49), (-36.86862915, 47.86862915), (-38, 47.4))
            ThreePointArc((-38, 47.4), (-39.13137085, 50.13137085), (-36.4, 49))
        make_face(mode=Mode.SUBTRACT)
        Polygon((38, -31), (35, -31), (35, -63.106154556), (35.888794811, -63.106154556), (41, -57.994949366), (41, -31), align=None)
        with BuildLine():
            ThreePointArc((39.6, -49), (36.86862915, -50.13137085), (38, -47.4))
            ThreePointArc((38, -47.4), (39.13137085, -47.86862915), (39.6, -49))
        make_face(mode=Mode.SUBTRACT)
        with BuildLine():
            ThreePointArc((38, -40.6), (36.4, -39), (38, -37.4))
            ThreePointArc((38, -37.4), (39.13137085, -37.86862915), (39.6, -39))
            ThreePointArc((39.6, -39), (39.13137085, -40.13137085), (38, -40.6))
        make_face(mode=Mode.SUBTRACT)
    extrude(amount=-BOSS_EXTRUDE15_DEPTH)

    # Sketch21 → Boss-Extrude16 (add)
    with BuildSketch(Plane.XY.offset(1.5)):
        with BuildLine():
            ThreePointArc((-32.25, -40.413329403), (-31.4, -39), (-32.25, -37.586670597))
            ThreePointArc((-32.25, -37.586670597), (-29.9, -39), (-32.25, -40.413329403))
        make_face()
        with BuildLine():
            ThreePointArc((-32.25, -50.413329403), (-31.4, -49), (-32.25, -47.586670597))
            ThreePointArc((-32.25, -47.586670597), (-29.9, -49), (-32.25, -50.413329403))
        make_face()
        with Locations((-35.25, -47.053077278)):
            Rectangle(SKETCH21_W, SKETCH21_H)
        Polygon((42.5, -56.494949366), (41, -57.994949366), (41, -31), (42.5, -31), align=None)
        with BuildLine():
            ThreePointArc((38.75, -50.413329403), (36.4, -49), (38.75, -47.586670597))
            ThreePointArc((38.75, -47.586670597), (37.9, -49), (38.75, -50.413329403))
        make_face()
        with BuildLine():
            ThreePointArc((38.75, -40.413329403), (36.4, -39), (38.75, -37.586670597))
            ThreePointArc((38.75, -37.586670597), (37.9, -39), (38.75, -40.413329403))
        make_face()
        with Locations((35.25, 47.053077278)):
            Rectangle(SKETCH21_W, SKETCH21_H)
        with BuildLine():
            ThreePointArc((32.25, 47.586670597), (29.9, 49), (32.25, 50.413329403))
            ThreePointArc((32.25, 50.413329403), (31.4, 49), (32.25, 47.586670597))
        make_face()
        with BuildLine():
            ThreePointArc((32.25, 37.586670597), (29.9, 39), (32.25, 40.413329403))
            ThreePointArc((32.25, 40.413329403), (31.4, 39), (32.25, 37.586670597))
        make_face()
        with BuildLine():
            ThreePointArc((-38.75, 47.586670597), (-37.9, 49), (-38.75, 50.413329403))
            ThreePointArc((-38.75, 50.413329403), (-36.4, 49), (-38.75, 47.586670597))
        make_face()
        with BuildLine():
            ThreePointArc((-38.75, 37.586670597), (-37.9, 39), (-38.75, 40.413329403))
            ThreePointArc((-38.75, 40.413329403), (-36.4, 39), (-38.75, 37.586670597))
        make_face()
        Polygon((-41, 57.994949366), (-41, 31), (-42.5, 31), (-42.5, 56.494949366), align=None)
    extrude(amount=-BOSS_EXTRUDE16_DEPTH)

    # Sketch22 → Cut-Extrude9 (cut)
    with BuildSketch(Plane.XY.offset(1.5)):
        with Locations((-39.5, 49)):
            Circle(SKETCH22_R)
        with Locations((-39.6, 39)):
            Circle(SKETCH22_R_2)
        with Locations((33, 49)):
            Circle(SKETCH22_R)
        with Locations((33, 39)):
            Circle(SKETCH22_R)
        with Locations((-33, -39)):
            Circle(SKETCH22_R)
        with Locations((-33, -49)):
            Circle(SKETCH22_R)
        with Locations((39.5, -39)):
            Circle(SKETCH22_R)
        with Locations((39.5, -49)):
            Circle(SKETCH22_R)
    extrude(amount=-CUT_EXTRUDE9_DEPTH, mode=Mode.SUBTRACT)

    # Sketch23 → Boss-Extrude17 (add)
    with BuildSketch(Plane.XY.offset(1.5)):
        Polygon((36, 31), (39.45, 31), (39.45, 59.544949366), (36, 62.994949366), align=None)
        Polygon((-36, -31), (-39.45, -31), (-39.45, -59.544949366), (-36, -62.994949366), align=None)
    extrude(amount=-BOSS_EXTRUDE17_DEPTH)

    # Sketch24 → Cut-Extrude10 (cut)
    with BuildSketch(Plane.XY.offset(1.5)):
        with Locations((-36.45, -49)):
            Circle(SKETCH24_R)
        with Locations((-36.45, -39)):
            Circle(SKETCH24_R)
        with Locations((36.45, 49)):
            Circle(SKETCH24_R)
        with Locations((36.45, 39)):
            Circle(SKETCH24_R)
    extrude(amount=-CUT_EXTRUDE10_DEPTH, mode=Mode.SUBTRACT)

    # Sketch25 → Boss-Extrude18 (add)
    with BuildSketch(Plane.XY.offset(1.5)):
        with BuildLine():
            Line((-93.258777892, -26.525048498), (-91.439555948, -32.242603178))
            Line((-91.439555948, -32.242603178), (-87.090389028, -30.85877734))
            ThreePointArc((-87.090389028, -30.85877734), (-85.14122266, -27.090389028), (-88.909610972, -25.14122266))
            Line((-88.909610972, -25.14122266), (-93.258777892, -26.525048498))
        make_face()
        with Locations((-88, -28)):
            Circle(SKETCH25_R, mode=Mode.SUBTRACT)
        with BuildLine():
            Line((-87.090389028, 30.85877734), (-91.439555948, 32.242603178))
            Line((-91.439555948, 32.242603178), (-93.258777892, 26.525048498))
            Line((-93.258777892, 26.525048498), (-88.909610972, 25.14122266))
            ThreePointArc((-88.909610972, 25.14122266), (-85.14122266, 27.090389028), (-87.090389028, 30.85877734))
        make_face()
        with Locations((-88, 28)):
            Circle(SKETCH25_R, mode=Mode.SUBTRACT)
        with BuildLine():
            Line((87.090389028, -30.85877734), (91.439555948, -32.242603178))
            Line((91.439555948, -32.242603178), (93.258777892, -26.525048498))
            Line((93.258777892, -26.525048498), (88.909610972, -25.14122266))
            ThreePointArc((88.909610972, -25.14122266), (85.14122266, -27.090389028), (87.090389028, -30.85877734))
        make_face()
        with Locations((88, -28)):
            Circle(SKETCH25_R, mode=Mode.SUBTRACT)
        with BuildLine():
            Line((93.258777892, 26.525048498), (91.439555948, 32.242603178))
            Line((91.439555948, 32.242603178), (87.090389028, 30.85877734))
            ThreePointArc((87.090389028, 30.85877734), (85.14122266, 27.090389028), (88.909610972, 25.14122266))
            Line((88.909610972, 25.14122266), (93.258777892, 26.525048498))
        make_face()
        with Locations((88, 28)):
            Circle(SKETCH25_R, mode=Mode.SUBTRACT)
    extrude(amount=-BOSS_EXTRUDE18_DEPTH)

    # Sketch26 → Cut-Extrude11 (cut)
    with BuildSketch(Plane.XY.offset(1.5)):
        with Locations((-88, 28)):
            Circle(SKETCH26_R)
        with Locations((-88, -28)):
            Circle(SKETCH26_R)
        with Locations((88, -28)):
            Circle(SKETCH26_R)
        with Locations((88, 28)):
            Circle(SKETCH26_R)
    extrude(amount=-CUT_EXTRUDE11_DEPTH, mode=Mode.SUBTRACT)

    # Sketch28 → Cut-Extrude12 (cut)
    with BuildSketch(Plane.XY.offset(1.5)):
        with Locations((-87.700363934, 39.046717735)):
            Circle(SKETCH28_R)
        with Locations((87.700363934, 39.046717735)):
            Circle(SKETCH28_R)
        with Locations((87.700363934, -39.046717735)):
            Circle(SKETCH28_R)
        with Locations((-87.700363934, -39.046717735)):
            Circle(SKETCH28_R)
    extrude(amount=-CUT_EXTRUDE12_DEPTH, mode=Mode.SUBTRACT)

    # Sketch29 → Boss-Extrude19 (add)
    with BuildSketch(Plane.XY.offset(1.5)):
        with BuildLine():
            Line((42.598378746, 89.366538079), (38.032036127, 79.786872289))
            Line((38.032036127, 79.786872289), (41.393256923, 64.252993798))
            Line((41.393256923, 64.252993798), (46.575002765, 72.29639768))
            Line((46.575002765, 72.29639768), (51.939928592, 80.62414407))
            Line((51.939928592, 80.62414407), (51.990700761, 80.70295555))
            ThreePointArc((51.990700761, 80.70295555), (52.360123748, 82.991062404), (50.988769416, 84.85956277))
            ThreePointArc((50.988769416, 84.85956277), (46.847804451, 87.214008153), (42.598378746, 89.366538079))
        make_face()
        with Locations((44.327866871, 85.153039985)):
            Circle(SKETCH29_R, mode=Mode.SUBTRACT)
        with Locations((49.443655191, 82.288060867)):
            Circle(SKETCH29_R, mode=Mode.SUBTRACT)
        with BuildLine():
            ThreePointArc((-50.988769416, 84.85956277), (-52.360123748, 82.991062404), (-51.990700761, 80.70295555))
            Line((-51.990700761, 80.70295555), (-51.939928592, 80.62414407))
            Line((-51.939928592, 80.62414407), (-46.575002765, 72.29639768))
            Line((-46.575002765, 72.29639768), (-41.393256923, 64.252993798))
            Line((-41.393256923, 64.252993798), (-38.032036127, 79.786872289))
            Line((-38.032036127, 79.786872289), (-42.598378746, 89.366538079))
            ThreePointArc((-42.598378746, 89.366538079), (-46.847804451, 87.214008153), (-50.988769416, 84.85956277))
        make_face()
        with Locations((-49.443655191, 82.288060867)):
            Circle(SKETCH29_R, mode=Mode.SUBTRACT)
        with Locations((-44.327866871, 85.153039985)):
            Circle(SKETCH29_R, mode=Mode.SUBTRACT)
        with BuildLine():
            Line((-42.598378746, -89.366538079), (-38.032036127, -79.786872289))
            Line((-38.032036127, -79.786872289), (-41.393256923, -64.252993798))
            Line((-41.393256923, -64.252993798), (-46.575002765, -72.29639768))
            Line((-46.575002765, -72.29639768), (-51.939928592, -80.62414407))
            Line((-51.939928592, -80.62414407), (-51.990700761, -80.70295555))
            ThreePointArc((-51.990700761, -80.70295555), (-52.360123748, -82.991062404), (-50.988769416, -84.85956277))
            ThreePointArc((-50.988769416, -84.85956277), (-46.847804451, -87.214008153), (-42.598378746, -89.366538079))
        make_face()
        with Locations((-49.443655191, -82.288060867)):
            Circle(SKETCH29_R, mode=Mode.SUBTRACT)
        with Locations((-44.327866871, -85.153039985)):
            Circle(SKETCH29_R, mode=Mode.SUBTRACT)
        with BuildLine():
            ThreePointArc((50.988769416, -84.85956277), (52.360123748, -82.991062404), (51.990700761, -80.70295555))
            Line((51.990700761, -80.70295555), (51.939928592, -80.62414407))
            Line((51.939928592, -80.62414407), (46.575002765, -72.29639768))
            Line((46.575002765, -72.29639768), (41.393256923, -64.252993798))
            Line((41.393256923, -64.252993798), (38.032036127, -79.786872289))
            Line((38.032036127, -79.786872289), (42.598378746, -89.366538079))
            ThreePointArc((42.598378746, -89.366538079), (46.847804451, -87.214008153), (50.988769416, -84.85956277))
        make_face()
        with Locations((44.327866871, -85.153039985)):
            Circle(SKETCH29_R, mode=Mode.SUBTRACT)
        with Locations((49.443655191, -82.288060867)):
            Circle(SKETCH29_R, mode=Mode.SUBTRACT)
    extrude(amount=-BOSS_EXTRUDE19_DEPTH)

    # Sketch30 → Cut-Extrude13 (cut)
    with BuildSketch(Plane.XY.offset(1.5)):
        with Locations((-30.975, -47.053077278)):
            Rectangle(SKETCH30_W, SKETCH30_H)
        with Locations((35.75, -47.053077278)):
            Rectangle(SKETCH30_W_2, SKETCH30_H)
        with Locations((-35.75, 47.053077278)):
            Rectangle(SKETCH30_W_2, SKETCH30_H)
        with Locations((30.975, 47.053077278)):
            Rectangle(SKETCH30_W, SKETCH30_H)
    extrude(amount=-CUT_EXTRUDE13_DEPTH, mode=Mode.SUBTRACT)

    # Sketch31 → Boss-Extrude20 (add)
    with BuildSketch(Plane.XY.offset(1.5)):
        Polygon((-33.45, -37.464584747), (-33.45, -54.487199965), (-35.24979153, -54.197542826), (-34.606108999, -47.664165134), (-34.927950264, -41.098603317), (-34.516917919, -36.926625012), align=None)
        Polygon((34.796478965, 51.236898102), (34.796478965, 47.17274868), (34.796478965, 35.517074868), (33.45, 32.015260587), (33.45, 51.901475994), align=None)
    extrude(amount=-BOSS_EXTRUDE20_DEPTH)

    # Sketch32 → Boss-Extrude21 (add)
    with BuildSketch(Plane.XY.offset(1.5)):
        with BuildLine():
            ThreePointArc((-47.898540967, 79.716558965), (-46.872153289, 83.833175092), (-50.988769416, 84.85956277))
            ThreePointArc((-50.988769416, 84.85956277), (-99, 0), (-50.988769416, -84.85956277))
            ThreePointArc((-50.988769416, -84.85956277), (-46.872153289, -83.833175092), (-47.898540967, -79.716558965))
            ThreePointArc((-47.898540967, -79.716558965), (-93, 0), (-47.898540967, 79.716558965))
        make_face()
        with Locations((-87.700363934, -39.046717735)):
            Circle(SKETCH32_R, mode=Mode.SUBTRACT)
        with Locations((-87.700363934, 39.046717735)):
            Circle(SKETCH32_R, mode=Mode.SUBTRACT)
        with Locations((-49.443655191, 82.288060867)):
            Circle(SKETCH32_R, mode=Mode.SUBTRACT)
        with Locations((-49.443655191, -82.288060867)):
            Circle(SKETCH32_R, mode=Mode.SUBTRACT)
    extrude(amount=-BOSS_EXTRUDE21_DEPTH)

    # Sketch33 → Cut-Extrude14 (cut)
    with BuildSketch(Plane.XY.offset(1.5)):
        with BuildLine():
            ThreePointArc((-47.898540967, 79.716558965), (-93, 0), (-47.898540967, -79.716558965))
            ThreePointArc((-47.898540967, -79.716558965), (-46.872153289, -83.833175092), (-50.988769416, -84.85956277))
            ThreePointArc((-50.988769416, -84.85956277), (99, 0), (-50.988769416, 84.85956277))
            ThreePointArc((-50.988769416, 84.85956277), (-46.872153289, 83.833175092), (-47.898540967, 79.716558965))
        make_face()
    extrude(amount=-CUT_EXTRUDE14_DEPTH, mode=Mode.SUBTRACT)

    # Sketch34 → Cut-Extrude15 (cut)
    with BuildSketch(Plane.XY.offset(1.5)):
        with Locations((-67.882250994, 67.882250994)):
            Circle(SKETCH34_R)
        with Locations((-96, 0)):
            Circle(SKETCH34_R)
        with Locations((-67.882250994, -67.882250994)):
            Circle(SKETCH34_R)
    extrude(amount=-CUT_EXTRUDE15_DEPTH, mode=Mode.SUBTRACT)


solid = part.part
